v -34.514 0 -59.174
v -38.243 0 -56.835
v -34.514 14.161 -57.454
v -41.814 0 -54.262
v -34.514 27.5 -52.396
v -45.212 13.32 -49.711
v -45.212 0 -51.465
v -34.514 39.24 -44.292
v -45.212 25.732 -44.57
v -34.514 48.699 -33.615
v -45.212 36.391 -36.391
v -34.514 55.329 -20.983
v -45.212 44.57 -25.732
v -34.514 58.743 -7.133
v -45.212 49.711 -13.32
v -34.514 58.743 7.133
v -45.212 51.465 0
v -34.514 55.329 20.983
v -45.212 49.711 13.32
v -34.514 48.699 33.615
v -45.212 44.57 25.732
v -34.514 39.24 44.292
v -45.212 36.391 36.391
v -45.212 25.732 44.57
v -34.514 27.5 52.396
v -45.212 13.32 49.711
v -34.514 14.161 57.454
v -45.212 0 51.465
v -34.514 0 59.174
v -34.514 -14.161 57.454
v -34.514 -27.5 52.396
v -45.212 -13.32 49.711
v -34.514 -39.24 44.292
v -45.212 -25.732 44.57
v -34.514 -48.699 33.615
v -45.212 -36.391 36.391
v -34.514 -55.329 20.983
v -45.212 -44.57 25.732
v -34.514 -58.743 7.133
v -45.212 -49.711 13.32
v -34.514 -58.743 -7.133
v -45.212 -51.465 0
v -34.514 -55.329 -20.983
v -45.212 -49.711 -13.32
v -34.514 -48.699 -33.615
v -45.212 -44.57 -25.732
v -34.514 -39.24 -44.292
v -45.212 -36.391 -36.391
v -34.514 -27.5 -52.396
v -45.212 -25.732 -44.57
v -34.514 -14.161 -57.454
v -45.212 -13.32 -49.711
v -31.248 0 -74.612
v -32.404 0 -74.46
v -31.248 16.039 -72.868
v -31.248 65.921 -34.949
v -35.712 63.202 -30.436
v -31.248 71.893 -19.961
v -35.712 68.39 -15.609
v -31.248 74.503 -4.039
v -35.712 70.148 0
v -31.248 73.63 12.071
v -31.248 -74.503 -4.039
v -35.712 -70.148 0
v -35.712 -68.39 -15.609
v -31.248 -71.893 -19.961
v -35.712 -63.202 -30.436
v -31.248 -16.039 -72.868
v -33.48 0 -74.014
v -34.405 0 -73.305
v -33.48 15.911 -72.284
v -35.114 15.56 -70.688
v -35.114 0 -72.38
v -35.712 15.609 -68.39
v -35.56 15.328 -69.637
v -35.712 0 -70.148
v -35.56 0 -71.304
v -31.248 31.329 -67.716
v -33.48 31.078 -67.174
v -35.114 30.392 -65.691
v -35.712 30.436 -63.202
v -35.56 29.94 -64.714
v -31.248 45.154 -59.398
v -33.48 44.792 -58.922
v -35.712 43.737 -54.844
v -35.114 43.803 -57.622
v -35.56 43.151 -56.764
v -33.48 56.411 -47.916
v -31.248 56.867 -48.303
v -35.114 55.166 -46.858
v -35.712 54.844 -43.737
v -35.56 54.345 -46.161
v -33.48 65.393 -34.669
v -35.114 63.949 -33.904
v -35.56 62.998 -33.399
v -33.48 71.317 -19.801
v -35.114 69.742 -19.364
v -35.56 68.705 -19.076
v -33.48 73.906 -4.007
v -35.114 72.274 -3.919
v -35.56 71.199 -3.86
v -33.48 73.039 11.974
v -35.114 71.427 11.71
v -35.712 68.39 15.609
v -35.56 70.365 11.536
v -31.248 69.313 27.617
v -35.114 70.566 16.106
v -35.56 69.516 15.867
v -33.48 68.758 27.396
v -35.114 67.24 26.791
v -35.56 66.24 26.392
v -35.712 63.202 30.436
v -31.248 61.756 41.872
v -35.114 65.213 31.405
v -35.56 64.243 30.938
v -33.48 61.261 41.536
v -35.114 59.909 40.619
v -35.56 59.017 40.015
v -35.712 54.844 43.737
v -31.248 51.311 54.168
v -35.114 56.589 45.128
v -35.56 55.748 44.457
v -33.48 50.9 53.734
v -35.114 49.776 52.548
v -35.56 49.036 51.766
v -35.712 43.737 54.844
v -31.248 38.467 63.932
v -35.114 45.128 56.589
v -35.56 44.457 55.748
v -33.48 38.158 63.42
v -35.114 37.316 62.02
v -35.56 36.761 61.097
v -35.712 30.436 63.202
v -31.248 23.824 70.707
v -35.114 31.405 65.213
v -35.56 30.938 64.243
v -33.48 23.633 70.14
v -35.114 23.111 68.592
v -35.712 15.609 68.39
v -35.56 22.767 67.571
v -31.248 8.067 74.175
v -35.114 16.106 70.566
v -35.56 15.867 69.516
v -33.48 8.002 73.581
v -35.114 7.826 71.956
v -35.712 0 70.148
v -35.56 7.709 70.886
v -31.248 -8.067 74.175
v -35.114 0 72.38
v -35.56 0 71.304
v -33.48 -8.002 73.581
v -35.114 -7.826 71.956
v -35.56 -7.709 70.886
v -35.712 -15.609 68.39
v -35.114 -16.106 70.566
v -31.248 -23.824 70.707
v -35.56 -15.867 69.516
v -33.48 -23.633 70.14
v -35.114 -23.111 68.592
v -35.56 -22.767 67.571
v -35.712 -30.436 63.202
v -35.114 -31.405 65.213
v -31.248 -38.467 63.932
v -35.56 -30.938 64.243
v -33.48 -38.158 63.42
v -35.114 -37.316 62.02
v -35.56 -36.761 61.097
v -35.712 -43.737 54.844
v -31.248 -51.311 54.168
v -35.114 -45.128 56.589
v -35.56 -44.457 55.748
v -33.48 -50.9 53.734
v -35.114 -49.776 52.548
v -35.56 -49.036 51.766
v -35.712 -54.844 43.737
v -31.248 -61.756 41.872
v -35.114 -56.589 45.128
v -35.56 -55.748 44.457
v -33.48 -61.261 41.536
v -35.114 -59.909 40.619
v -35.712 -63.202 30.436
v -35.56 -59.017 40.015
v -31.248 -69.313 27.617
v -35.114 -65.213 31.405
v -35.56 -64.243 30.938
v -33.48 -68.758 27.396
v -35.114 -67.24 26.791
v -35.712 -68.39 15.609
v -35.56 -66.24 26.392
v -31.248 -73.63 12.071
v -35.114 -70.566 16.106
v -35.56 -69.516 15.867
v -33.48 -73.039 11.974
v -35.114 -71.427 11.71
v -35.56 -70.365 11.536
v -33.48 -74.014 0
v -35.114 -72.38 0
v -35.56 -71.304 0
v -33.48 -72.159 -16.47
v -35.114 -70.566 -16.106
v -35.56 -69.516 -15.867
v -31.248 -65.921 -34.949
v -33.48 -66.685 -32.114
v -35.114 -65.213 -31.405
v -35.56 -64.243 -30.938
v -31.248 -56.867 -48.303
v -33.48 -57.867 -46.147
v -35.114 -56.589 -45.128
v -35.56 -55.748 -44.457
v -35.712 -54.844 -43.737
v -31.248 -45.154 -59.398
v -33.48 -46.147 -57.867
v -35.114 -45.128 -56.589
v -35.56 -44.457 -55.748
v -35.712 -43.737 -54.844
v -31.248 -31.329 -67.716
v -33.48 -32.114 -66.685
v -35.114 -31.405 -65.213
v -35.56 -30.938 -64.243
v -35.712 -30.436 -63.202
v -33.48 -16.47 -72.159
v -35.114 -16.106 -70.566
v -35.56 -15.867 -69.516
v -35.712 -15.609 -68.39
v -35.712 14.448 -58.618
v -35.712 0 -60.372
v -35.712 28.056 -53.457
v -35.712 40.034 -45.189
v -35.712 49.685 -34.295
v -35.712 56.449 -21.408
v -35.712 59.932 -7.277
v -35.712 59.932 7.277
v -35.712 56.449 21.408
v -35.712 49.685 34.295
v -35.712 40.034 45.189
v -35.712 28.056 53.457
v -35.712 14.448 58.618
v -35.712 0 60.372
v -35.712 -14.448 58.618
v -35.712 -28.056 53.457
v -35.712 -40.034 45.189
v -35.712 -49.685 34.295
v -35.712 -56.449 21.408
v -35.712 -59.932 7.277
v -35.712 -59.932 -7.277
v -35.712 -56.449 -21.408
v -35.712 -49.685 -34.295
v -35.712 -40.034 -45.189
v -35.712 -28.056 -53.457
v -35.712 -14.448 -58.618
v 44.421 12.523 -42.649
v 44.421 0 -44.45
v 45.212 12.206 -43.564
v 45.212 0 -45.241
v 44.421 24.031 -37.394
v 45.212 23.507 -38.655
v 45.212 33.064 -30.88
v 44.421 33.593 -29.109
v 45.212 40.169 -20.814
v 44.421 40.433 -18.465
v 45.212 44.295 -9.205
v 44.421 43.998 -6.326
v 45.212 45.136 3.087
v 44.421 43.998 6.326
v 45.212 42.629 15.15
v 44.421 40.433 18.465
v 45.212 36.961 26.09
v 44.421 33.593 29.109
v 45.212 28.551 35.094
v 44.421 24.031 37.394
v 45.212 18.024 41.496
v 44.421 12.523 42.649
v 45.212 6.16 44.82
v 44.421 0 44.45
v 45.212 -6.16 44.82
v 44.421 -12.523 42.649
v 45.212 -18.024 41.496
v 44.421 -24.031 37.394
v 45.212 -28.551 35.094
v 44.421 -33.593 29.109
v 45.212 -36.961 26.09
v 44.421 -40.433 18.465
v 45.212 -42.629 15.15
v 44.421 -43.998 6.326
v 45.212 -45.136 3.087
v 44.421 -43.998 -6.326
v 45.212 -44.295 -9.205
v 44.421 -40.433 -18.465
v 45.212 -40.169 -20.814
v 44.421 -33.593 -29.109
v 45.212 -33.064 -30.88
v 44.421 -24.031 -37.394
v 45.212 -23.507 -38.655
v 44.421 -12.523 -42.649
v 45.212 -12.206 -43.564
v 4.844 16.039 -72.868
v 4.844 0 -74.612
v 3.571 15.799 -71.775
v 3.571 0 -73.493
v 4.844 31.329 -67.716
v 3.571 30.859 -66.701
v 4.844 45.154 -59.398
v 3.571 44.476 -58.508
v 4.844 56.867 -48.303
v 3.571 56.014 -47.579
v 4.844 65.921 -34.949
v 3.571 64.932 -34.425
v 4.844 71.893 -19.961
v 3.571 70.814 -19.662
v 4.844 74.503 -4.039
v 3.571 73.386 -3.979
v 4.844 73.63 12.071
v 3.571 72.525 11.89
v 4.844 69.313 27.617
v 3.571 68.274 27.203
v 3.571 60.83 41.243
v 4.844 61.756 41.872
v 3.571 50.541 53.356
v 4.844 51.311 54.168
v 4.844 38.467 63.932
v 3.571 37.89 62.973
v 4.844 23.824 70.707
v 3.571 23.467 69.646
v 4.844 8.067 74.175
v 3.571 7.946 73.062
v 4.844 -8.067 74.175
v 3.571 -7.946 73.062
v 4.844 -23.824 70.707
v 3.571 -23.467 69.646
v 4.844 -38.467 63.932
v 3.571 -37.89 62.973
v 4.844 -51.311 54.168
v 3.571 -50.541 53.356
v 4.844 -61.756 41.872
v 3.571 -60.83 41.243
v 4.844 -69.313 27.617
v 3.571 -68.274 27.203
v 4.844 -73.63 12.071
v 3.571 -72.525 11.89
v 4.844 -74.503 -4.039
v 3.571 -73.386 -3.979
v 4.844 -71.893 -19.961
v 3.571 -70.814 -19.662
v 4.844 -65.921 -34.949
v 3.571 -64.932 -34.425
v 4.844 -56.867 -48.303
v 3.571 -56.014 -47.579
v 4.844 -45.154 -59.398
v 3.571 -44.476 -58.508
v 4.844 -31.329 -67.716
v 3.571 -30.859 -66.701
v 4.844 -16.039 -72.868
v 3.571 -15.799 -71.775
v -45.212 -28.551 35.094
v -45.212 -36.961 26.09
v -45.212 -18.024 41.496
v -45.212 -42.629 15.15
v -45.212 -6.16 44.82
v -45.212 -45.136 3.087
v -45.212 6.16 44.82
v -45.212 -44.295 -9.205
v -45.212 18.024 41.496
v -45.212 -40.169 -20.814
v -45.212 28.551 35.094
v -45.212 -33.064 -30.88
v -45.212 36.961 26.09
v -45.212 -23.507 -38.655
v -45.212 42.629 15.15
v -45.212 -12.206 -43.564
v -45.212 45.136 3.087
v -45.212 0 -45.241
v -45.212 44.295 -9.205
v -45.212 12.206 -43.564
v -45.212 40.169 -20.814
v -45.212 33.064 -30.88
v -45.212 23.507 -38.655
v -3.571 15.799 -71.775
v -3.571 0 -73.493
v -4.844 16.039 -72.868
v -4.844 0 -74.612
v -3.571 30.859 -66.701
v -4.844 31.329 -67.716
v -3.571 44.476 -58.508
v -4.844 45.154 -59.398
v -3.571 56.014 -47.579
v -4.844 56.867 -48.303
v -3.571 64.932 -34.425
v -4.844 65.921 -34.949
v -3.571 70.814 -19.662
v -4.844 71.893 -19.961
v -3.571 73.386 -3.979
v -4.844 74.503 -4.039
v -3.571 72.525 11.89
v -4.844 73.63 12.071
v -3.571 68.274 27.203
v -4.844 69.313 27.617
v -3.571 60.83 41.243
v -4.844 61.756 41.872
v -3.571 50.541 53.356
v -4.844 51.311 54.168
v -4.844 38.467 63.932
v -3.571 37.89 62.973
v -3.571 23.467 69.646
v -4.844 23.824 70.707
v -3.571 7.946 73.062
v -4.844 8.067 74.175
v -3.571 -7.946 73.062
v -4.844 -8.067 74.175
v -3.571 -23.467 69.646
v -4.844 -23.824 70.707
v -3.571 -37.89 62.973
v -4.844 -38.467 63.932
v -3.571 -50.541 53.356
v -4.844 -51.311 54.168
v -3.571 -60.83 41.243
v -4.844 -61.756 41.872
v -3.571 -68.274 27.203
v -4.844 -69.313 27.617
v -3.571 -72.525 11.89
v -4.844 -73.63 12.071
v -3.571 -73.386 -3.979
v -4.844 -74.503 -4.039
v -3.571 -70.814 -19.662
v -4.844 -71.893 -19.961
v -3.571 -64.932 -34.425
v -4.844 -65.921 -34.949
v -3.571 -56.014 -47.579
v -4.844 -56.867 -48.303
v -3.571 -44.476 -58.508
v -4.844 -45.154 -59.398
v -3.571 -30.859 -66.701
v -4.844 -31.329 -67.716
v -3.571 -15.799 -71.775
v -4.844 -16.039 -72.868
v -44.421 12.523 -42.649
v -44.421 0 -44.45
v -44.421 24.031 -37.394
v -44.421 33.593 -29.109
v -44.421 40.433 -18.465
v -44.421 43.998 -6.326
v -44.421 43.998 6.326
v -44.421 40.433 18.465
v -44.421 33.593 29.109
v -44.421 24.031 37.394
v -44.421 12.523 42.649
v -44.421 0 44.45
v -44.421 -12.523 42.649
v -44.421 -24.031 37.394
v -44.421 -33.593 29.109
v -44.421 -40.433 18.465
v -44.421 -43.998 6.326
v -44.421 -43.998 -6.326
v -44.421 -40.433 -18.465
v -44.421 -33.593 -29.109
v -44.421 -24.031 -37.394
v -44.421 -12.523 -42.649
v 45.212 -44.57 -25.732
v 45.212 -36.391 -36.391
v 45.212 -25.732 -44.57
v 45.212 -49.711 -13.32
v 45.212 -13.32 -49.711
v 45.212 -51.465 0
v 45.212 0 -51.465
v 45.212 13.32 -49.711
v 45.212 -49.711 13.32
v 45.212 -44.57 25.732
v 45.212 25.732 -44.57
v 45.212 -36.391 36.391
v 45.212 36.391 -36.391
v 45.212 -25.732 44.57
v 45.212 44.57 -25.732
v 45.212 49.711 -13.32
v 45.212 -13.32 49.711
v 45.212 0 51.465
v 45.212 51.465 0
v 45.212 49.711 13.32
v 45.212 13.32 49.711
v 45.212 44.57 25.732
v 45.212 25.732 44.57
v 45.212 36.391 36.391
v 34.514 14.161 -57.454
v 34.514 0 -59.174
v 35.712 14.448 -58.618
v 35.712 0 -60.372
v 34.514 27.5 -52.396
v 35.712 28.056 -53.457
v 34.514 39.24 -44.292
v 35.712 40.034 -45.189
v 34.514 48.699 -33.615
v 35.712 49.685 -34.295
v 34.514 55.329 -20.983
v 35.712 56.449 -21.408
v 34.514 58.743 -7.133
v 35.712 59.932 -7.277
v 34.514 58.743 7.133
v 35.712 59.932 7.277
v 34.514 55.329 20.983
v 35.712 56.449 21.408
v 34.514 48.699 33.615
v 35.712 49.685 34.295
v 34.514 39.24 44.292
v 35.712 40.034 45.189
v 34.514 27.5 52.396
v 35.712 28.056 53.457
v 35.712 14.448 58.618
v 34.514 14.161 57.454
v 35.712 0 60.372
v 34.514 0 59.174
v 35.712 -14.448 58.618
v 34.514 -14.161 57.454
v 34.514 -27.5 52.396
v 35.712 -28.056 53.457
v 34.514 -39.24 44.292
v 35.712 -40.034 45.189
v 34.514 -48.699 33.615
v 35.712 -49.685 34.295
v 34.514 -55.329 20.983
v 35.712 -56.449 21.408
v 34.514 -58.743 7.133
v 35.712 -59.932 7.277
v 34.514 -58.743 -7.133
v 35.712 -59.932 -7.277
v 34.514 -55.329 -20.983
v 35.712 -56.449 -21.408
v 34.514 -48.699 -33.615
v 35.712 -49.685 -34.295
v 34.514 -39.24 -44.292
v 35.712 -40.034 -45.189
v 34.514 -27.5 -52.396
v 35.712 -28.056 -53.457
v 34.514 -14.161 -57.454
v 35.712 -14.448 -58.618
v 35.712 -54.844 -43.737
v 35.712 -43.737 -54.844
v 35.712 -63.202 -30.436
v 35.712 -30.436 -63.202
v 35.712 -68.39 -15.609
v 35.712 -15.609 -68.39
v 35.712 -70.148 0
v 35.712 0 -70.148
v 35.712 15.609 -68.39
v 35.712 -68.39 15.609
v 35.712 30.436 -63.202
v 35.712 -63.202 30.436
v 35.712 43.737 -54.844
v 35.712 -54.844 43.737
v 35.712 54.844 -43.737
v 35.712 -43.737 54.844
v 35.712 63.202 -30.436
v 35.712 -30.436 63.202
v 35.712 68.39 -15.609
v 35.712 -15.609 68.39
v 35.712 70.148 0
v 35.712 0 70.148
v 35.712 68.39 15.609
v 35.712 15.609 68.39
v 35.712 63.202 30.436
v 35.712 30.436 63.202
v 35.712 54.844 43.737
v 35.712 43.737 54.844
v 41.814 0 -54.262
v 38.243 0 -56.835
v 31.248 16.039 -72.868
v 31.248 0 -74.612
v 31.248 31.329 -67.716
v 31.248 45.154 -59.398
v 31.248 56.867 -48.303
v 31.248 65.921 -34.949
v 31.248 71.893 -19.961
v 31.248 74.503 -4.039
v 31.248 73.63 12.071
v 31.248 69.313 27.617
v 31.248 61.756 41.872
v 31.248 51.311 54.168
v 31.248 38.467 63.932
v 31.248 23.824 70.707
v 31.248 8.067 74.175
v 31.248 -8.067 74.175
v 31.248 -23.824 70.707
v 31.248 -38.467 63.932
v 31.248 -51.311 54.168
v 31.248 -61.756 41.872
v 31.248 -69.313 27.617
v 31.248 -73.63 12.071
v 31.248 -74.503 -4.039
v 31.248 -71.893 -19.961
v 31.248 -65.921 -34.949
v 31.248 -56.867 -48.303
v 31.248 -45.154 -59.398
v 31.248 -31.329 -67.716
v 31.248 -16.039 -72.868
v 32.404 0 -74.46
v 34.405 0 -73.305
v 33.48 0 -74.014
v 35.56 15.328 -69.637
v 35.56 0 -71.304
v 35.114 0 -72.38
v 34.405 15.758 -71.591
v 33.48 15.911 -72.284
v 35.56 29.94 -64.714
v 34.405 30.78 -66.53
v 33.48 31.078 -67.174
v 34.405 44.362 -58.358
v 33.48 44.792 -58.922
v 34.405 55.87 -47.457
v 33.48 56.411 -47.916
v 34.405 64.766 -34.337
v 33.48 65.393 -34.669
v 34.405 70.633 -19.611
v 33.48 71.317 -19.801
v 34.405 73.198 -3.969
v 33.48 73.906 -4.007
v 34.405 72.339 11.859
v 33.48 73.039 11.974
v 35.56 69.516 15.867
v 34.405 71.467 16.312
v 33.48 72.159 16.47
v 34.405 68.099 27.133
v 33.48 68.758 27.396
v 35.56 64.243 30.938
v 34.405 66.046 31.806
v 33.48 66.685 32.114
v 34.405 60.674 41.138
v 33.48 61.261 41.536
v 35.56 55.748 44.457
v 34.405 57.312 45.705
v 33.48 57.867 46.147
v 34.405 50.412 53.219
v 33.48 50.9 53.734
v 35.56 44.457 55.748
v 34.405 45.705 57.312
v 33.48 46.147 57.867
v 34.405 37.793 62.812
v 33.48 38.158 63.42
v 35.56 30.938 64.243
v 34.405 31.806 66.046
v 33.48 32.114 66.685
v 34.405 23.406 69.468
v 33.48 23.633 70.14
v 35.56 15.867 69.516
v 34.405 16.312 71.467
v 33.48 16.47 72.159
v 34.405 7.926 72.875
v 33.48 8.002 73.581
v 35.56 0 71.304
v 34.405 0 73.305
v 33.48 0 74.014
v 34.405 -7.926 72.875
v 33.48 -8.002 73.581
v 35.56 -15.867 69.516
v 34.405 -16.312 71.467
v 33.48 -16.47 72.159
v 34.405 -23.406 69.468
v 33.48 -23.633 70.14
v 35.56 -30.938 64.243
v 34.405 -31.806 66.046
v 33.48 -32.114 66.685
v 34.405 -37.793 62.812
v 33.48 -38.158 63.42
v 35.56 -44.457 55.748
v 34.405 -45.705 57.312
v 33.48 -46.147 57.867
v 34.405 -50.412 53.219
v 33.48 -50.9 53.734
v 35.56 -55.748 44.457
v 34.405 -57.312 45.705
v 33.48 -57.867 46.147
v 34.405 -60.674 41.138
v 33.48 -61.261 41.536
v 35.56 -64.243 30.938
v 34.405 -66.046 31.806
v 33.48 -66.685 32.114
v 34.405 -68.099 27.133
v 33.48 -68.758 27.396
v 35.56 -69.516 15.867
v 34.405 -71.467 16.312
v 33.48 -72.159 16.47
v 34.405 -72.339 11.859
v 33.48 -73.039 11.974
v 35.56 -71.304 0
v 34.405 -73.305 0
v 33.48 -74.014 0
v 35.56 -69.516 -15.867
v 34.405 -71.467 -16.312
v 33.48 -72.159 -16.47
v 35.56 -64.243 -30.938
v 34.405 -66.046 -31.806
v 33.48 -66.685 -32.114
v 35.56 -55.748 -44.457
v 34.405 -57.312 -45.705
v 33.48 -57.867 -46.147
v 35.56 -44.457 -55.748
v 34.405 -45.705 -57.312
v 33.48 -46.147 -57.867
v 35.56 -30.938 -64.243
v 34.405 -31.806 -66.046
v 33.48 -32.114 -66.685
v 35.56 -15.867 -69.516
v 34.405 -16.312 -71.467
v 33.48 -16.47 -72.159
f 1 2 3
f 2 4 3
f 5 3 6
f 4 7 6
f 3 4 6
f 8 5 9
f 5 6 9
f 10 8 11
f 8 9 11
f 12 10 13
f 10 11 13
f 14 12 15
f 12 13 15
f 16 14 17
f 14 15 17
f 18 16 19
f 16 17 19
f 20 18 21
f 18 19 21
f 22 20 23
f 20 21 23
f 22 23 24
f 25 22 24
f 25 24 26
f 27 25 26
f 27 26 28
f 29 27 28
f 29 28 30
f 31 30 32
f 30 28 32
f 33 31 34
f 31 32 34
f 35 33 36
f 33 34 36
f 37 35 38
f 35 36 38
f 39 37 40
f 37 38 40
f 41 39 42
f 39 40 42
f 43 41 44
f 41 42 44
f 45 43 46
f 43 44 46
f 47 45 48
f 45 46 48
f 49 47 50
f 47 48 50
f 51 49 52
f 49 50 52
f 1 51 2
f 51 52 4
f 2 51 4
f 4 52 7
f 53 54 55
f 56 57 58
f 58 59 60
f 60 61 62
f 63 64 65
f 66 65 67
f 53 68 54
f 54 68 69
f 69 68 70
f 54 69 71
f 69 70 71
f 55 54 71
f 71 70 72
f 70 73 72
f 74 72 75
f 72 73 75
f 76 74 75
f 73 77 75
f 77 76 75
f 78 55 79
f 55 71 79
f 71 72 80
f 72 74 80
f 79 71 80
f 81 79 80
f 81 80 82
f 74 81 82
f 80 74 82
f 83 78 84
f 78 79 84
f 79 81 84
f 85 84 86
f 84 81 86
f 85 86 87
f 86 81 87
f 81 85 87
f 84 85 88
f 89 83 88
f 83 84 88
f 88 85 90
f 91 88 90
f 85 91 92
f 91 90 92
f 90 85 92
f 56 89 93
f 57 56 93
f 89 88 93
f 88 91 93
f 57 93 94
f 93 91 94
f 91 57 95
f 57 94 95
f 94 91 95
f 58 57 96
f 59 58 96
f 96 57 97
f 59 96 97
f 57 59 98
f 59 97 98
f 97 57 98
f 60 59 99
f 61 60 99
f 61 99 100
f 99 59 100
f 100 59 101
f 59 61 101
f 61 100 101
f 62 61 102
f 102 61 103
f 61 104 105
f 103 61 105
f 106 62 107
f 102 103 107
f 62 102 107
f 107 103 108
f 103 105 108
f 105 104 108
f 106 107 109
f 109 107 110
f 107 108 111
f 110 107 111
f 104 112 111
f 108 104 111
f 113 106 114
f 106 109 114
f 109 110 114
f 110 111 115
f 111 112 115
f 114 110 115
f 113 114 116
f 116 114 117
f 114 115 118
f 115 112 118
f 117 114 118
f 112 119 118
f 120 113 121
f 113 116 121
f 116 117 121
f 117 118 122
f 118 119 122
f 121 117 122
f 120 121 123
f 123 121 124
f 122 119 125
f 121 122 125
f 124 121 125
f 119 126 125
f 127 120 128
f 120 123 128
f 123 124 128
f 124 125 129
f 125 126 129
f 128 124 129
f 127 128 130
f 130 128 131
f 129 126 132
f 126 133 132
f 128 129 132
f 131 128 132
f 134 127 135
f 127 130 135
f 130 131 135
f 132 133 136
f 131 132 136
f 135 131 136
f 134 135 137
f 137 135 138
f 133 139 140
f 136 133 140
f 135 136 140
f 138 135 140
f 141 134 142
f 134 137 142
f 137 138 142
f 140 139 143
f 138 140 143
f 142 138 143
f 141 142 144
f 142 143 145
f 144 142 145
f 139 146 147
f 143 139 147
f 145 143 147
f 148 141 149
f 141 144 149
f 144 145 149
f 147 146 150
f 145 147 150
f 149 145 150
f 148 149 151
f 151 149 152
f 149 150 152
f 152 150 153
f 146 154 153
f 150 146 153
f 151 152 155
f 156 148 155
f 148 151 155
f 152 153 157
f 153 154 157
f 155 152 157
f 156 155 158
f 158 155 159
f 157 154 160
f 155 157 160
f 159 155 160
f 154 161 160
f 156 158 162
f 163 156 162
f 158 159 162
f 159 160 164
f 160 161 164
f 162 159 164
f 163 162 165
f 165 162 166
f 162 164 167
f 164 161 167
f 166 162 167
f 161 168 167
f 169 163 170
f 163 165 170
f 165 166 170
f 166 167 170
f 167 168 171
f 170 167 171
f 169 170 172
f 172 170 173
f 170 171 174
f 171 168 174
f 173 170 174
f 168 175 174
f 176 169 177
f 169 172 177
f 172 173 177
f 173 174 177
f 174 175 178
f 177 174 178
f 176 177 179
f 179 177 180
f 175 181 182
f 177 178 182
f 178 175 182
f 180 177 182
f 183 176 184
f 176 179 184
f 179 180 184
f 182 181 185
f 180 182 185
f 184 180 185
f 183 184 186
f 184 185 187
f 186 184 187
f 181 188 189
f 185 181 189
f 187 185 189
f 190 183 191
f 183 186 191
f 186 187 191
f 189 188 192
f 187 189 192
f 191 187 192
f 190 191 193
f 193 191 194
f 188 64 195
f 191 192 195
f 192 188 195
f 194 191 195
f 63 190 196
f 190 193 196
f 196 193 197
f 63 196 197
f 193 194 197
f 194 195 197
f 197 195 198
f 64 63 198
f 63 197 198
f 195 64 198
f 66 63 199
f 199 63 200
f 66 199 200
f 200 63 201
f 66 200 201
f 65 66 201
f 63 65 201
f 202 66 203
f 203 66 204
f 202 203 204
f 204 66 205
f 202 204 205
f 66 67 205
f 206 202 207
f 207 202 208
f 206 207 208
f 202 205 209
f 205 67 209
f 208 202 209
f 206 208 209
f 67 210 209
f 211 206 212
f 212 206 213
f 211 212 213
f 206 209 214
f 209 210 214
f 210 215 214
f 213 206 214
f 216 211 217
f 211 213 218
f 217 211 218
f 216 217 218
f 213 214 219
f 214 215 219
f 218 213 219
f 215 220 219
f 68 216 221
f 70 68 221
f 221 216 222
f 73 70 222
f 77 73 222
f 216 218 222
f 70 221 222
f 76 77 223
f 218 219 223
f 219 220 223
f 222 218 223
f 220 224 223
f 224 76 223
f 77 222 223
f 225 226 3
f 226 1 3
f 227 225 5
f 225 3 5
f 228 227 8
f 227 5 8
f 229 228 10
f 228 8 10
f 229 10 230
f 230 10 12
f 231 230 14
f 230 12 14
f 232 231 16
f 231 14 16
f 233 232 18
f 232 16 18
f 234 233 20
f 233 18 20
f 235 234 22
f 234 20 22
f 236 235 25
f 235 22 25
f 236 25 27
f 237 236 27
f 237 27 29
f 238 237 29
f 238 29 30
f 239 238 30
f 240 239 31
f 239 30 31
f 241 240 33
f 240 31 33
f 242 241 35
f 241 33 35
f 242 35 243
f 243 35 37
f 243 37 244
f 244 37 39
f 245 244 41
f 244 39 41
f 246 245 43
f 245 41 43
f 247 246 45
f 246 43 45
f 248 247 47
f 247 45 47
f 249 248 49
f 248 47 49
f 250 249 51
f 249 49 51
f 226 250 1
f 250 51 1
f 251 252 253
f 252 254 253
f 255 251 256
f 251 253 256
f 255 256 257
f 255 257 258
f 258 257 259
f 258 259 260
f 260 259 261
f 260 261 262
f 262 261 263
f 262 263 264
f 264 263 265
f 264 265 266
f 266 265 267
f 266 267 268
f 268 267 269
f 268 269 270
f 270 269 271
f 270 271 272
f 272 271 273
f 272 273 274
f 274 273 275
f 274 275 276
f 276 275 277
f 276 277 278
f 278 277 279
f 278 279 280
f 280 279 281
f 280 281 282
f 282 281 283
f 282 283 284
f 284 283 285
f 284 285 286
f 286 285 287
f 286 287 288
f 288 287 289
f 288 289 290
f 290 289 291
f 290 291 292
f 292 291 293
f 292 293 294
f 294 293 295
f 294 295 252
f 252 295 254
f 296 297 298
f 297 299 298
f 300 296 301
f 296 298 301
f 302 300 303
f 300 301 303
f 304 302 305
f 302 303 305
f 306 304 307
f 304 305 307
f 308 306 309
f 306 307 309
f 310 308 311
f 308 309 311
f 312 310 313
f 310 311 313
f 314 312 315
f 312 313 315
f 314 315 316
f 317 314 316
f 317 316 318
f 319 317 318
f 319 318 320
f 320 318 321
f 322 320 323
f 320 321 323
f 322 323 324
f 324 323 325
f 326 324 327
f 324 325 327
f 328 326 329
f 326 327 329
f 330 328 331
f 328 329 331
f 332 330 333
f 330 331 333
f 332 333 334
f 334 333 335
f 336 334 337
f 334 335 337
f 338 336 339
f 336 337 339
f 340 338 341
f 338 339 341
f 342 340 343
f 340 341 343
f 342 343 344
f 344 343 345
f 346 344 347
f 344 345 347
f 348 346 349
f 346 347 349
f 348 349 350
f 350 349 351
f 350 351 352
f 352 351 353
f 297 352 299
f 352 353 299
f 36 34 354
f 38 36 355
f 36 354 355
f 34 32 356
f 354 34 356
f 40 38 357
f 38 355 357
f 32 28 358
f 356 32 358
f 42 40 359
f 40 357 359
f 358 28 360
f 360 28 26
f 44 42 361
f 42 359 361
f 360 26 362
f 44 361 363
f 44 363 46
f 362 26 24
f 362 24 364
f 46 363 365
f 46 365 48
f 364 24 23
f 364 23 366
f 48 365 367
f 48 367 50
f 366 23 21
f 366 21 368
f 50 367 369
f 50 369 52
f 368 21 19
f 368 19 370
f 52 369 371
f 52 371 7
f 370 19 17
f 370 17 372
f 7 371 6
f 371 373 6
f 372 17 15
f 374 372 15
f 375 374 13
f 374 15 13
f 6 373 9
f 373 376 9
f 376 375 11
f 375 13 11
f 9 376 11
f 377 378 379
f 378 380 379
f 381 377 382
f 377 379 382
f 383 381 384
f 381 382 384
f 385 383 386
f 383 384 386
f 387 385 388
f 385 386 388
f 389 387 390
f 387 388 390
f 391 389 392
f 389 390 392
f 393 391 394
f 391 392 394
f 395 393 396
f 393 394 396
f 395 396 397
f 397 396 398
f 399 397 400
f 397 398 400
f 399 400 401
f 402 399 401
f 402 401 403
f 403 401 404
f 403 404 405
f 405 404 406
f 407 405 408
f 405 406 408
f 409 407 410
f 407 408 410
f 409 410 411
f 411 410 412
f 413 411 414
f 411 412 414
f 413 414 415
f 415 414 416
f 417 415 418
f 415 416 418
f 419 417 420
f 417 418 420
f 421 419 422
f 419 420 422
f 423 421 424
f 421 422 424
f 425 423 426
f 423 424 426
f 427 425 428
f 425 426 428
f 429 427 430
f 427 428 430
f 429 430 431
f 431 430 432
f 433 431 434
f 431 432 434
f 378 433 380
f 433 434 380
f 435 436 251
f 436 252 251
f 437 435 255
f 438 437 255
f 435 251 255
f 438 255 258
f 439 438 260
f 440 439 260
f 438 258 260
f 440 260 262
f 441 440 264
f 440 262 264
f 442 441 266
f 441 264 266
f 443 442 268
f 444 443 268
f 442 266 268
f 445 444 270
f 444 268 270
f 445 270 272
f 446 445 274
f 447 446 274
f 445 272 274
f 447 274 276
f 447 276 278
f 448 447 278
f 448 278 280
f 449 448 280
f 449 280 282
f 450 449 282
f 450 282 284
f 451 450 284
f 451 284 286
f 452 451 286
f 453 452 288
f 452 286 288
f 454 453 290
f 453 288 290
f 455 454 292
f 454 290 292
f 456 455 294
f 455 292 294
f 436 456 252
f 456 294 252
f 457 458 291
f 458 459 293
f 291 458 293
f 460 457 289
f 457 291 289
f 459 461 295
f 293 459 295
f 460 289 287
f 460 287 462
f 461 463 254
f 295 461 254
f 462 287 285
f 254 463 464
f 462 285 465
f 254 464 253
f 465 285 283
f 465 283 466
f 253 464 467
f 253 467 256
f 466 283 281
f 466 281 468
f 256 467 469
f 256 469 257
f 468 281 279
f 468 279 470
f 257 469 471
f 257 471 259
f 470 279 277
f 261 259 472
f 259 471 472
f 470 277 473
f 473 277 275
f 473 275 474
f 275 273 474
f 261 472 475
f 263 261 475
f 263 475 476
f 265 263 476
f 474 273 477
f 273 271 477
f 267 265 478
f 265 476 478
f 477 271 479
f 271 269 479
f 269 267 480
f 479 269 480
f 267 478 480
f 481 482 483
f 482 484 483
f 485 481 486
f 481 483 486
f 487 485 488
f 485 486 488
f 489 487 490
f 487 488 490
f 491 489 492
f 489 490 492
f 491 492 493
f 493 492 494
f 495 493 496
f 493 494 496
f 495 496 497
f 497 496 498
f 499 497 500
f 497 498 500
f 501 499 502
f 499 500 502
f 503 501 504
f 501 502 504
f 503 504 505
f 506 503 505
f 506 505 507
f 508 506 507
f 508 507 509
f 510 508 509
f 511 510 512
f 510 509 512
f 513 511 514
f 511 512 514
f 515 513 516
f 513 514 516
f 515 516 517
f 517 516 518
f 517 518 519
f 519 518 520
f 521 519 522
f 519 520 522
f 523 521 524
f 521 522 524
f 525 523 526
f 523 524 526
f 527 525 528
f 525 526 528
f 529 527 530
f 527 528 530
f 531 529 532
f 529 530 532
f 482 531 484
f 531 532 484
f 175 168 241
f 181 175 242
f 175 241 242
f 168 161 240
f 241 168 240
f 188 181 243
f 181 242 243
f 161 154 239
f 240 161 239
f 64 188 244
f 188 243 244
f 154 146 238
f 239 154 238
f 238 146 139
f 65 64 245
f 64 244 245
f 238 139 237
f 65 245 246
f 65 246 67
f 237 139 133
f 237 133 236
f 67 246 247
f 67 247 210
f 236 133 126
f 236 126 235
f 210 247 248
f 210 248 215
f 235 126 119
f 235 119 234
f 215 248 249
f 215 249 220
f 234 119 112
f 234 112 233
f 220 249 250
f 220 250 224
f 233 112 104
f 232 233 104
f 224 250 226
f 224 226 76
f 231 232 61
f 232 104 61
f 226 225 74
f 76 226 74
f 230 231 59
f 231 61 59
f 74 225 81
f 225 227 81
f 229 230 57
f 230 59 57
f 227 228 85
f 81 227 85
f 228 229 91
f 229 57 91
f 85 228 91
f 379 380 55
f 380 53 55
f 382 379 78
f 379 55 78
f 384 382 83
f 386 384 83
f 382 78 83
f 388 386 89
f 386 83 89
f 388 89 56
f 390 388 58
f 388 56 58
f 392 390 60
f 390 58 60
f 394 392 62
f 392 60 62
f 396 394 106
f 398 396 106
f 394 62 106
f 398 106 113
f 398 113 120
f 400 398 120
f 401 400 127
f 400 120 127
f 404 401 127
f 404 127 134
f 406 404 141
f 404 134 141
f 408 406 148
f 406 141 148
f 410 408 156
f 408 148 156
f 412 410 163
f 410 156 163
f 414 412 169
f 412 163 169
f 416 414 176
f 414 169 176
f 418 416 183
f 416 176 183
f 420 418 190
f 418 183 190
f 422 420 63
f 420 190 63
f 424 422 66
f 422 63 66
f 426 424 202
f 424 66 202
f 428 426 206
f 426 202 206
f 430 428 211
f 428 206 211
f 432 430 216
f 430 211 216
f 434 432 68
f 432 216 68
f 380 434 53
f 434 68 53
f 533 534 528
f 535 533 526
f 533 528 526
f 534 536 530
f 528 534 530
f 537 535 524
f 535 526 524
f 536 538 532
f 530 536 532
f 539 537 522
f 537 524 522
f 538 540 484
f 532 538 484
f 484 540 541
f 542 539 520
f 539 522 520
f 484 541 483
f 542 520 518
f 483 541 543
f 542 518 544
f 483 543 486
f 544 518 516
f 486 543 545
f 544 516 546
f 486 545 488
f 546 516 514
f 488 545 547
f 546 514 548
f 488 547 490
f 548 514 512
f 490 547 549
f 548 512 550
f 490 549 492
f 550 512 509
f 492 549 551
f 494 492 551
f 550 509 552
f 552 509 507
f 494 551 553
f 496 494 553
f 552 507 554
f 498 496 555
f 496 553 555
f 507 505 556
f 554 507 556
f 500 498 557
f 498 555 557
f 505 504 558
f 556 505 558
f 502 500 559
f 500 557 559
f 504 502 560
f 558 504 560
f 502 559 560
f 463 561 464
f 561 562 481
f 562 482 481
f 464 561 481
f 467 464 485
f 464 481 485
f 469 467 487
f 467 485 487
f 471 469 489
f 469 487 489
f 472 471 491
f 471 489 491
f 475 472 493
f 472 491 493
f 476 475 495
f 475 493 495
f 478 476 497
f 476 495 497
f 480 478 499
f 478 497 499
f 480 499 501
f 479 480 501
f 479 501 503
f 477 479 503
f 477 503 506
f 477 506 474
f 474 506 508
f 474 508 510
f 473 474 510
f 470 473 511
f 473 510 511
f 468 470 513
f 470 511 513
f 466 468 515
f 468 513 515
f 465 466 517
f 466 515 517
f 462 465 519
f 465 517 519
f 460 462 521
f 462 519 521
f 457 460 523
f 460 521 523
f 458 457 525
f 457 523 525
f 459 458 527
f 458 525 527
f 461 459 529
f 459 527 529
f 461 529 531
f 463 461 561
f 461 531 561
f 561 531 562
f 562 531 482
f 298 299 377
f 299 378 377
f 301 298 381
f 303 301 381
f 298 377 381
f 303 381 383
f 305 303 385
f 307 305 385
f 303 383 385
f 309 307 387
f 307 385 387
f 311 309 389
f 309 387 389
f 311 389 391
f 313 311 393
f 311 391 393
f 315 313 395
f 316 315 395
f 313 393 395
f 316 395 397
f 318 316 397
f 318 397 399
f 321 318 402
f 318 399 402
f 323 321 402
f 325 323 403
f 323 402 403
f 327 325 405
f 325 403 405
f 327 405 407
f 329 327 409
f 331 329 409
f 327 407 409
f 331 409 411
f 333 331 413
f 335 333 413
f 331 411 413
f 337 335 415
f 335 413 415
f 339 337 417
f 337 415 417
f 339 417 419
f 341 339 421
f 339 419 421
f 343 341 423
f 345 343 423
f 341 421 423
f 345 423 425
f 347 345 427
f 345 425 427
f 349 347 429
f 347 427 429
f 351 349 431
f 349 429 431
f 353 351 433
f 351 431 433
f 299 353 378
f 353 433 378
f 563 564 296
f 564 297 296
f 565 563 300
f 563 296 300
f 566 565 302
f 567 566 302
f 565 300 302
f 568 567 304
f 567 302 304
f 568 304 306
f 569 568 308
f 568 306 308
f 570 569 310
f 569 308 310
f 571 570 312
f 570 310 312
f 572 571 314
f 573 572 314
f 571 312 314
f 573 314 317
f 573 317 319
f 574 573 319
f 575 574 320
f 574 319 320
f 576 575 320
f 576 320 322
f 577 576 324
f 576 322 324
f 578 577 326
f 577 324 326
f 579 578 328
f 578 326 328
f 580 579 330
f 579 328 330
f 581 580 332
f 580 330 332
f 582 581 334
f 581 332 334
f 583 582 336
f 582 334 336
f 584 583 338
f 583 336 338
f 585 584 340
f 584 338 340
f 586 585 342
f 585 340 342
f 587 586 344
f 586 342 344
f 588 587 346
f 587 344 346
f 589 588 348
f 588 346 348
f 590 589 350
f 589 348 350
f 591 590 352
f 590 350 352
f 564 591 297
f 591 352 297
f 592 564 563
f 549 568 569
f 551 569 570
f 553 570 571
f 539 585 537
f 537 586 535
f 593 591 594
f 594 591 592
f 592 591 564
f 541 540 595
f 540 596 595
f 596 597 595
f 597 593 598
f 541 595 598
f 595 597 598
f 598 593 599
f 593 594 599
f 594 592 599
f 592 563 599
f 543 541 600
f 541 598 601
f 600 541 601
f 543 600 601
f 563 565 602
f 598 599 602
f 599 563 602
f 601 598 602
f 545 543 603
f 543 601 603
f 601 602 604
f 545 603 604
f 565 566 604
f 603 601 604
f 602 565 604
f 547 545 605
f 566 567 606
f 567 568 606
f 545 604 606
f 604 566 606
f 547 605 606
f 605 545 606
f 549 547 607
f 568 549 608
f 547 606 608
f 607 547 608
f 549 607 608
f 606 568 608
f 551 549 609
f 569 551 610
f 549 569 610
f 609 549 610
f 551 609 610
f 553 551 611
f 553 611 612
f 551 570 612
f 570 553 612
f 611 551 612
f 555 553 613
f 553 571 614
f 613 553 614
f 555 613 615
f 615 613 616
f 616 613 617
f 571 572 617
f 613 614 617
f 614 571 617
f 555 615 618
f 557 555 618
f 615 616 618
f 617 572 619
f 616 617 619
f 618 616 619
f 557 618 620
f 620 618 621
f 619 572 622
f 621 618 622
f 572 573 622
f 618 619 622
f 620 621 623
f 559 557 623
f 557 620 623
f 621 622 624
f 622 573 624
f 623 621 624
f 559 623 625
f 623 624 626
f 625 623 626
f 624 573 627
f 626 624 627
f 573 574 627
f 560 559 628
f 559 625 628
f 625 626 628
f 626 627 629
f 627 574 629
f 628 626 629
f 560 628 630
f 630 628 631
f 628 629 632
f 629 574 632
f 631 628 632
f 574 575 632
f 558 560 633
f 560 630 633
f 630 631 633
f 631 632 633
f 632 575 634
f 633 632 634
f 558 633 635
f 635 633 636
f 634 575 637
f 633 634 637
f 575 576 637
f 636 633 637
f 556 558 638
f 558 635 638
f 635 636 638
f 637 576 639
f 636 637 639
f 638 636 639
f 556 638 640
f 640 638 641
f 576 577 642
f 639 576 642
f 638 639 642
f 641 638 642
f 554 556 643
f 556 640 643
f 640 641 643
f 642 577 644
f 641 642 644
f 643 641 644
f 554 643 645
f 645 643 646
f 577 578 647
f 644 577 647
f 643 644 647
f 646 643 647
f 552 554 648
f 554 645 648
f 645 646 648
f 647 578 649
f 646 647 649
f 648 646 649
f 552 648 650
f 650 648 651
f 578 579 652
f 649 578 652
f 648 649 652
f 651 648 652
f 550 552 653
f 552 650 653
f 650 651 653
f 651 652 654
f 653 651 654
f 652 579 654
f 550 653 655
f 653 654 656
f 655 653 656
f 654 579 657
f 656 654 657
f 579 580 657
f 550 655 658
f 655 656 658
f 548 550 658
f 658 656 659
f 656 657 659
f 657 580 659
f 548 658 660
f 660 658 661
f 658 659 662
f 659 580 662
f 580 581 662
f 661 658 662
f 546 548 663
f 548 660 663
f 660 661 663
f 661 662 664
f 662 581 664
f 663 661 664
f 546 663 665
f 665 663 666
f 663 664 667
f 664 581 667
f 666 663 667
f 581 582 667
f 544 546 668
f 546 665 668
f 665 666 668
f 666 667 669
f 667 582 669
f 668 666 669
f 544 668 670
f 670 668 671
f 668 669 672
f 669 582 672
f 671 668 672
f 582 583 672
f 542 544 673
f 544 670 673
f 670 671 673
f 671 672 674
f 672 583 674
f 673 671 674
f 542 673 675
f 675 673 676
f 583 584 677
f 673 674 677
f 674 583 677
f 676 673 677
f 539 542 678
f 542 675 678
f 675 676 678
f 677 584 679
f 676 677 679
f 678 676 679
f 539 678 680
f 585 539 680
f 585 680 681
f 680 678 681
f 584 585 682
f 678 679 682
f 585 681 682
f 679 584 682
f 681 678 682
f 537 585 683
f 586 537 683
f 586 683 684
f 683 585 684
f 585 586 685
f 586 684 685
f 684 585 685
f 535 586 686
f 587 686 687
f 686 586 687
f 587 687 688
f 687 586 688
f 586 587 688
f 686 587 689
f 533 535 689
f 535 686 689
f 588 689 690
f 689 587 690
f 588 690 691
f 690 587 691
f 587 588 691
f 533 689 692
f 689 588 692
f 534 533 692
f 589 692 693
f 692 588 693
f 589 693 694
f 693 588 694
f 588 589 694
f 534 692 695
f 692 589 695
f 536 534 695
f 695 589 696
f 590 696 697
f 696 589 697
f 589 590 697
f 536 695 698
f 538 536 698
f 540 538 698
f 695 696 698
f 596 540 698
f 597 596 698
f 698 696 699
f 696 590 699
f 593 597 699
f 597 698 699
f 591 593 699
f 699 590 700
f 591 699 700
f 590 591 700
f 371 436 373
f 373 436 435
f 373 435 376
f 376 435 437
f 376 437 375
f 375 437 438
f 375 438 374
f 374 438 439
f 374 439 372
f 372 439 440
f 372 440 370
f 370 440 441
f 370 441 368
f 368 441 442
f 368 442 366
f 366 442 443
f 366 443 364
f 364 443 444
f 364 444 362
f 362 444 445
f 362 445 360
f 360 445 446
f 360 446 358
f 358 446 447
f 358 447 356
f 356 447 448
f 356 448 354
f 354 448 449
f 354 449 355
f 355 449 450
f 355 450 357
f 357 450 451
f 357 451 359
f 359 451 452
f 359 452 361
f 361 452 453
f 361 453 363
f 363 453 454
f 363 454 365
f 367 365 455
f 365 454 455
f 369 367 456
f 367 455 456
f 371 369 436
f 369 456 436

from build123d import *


with BuildPart() as part:
    # Sketch1 → Revolve1 (revolve)
    with BuildSketch(Plane.XY, mode=Mode.PRIVATE) as revolve1_sk:
        with BuildLine():
            Line((-45.212, 51.464994612), (-45.212, 45.241385071))
            Line((-45.212, 45.241385071), (-44.420614929, 44.45))
            Line((-44.420614929, 44.45), (44.420614929, 44.45))
            Line((44.420614929, 44.45), (45.212, 45.241385071))
            Line((45.212, 45.241385071), (45.212, 51.464994612))
            ThreePointArc((45.212, 51.464994612), (40.048905798, 55.577475283), (34.513977442, 59.173946763))
            Line((34.513977442, 59.173946763), (35.7124, 60.372369321))
            Line((35.7124, 60.372369321), (35.7124, 70.14845))
            ThreePointArc((35.7124, 70.14845), (34.404910027, 73.305010027), (31.24835, 74.6125))
            Line((31.24835, 74.6125), (4.843974298, 74.6125))
            Line((4.843974298, 74.6125), (3.57124, 73.4933125))
            Line((3.57124, 73.4933125), (-3.57124, 73.4933125))
            Line((-3.57124, 73.4933125), (-4.843974298, 74.6125))
            Line((-4.843974298, 74.6125), (-31.24835, 74.6125))
            ThreePointArc((-31.24835, 74.6125), (-34.404910027, 73.305010027), (-35.7124, 70.14845))
            Line((-35.7124, 70.14845), (-35.7124, 60.372369321))
            Line((-35.7124, 60.372369321), (-34.513977442, 59.173946763))
            ThreePointArc((-34.513977442, 59.173946763), (-40.048905798, 55.577475283), (-45.212, 51.464994612))
        make_face()
    revolve(revolve1_sk.sketch.rotate(Axis((-45.212, 0, 0), (1, 0, 0)), 270), axis=Axis((-45.212, 0, 0), (1, 0, 0)))


solid = part.part
